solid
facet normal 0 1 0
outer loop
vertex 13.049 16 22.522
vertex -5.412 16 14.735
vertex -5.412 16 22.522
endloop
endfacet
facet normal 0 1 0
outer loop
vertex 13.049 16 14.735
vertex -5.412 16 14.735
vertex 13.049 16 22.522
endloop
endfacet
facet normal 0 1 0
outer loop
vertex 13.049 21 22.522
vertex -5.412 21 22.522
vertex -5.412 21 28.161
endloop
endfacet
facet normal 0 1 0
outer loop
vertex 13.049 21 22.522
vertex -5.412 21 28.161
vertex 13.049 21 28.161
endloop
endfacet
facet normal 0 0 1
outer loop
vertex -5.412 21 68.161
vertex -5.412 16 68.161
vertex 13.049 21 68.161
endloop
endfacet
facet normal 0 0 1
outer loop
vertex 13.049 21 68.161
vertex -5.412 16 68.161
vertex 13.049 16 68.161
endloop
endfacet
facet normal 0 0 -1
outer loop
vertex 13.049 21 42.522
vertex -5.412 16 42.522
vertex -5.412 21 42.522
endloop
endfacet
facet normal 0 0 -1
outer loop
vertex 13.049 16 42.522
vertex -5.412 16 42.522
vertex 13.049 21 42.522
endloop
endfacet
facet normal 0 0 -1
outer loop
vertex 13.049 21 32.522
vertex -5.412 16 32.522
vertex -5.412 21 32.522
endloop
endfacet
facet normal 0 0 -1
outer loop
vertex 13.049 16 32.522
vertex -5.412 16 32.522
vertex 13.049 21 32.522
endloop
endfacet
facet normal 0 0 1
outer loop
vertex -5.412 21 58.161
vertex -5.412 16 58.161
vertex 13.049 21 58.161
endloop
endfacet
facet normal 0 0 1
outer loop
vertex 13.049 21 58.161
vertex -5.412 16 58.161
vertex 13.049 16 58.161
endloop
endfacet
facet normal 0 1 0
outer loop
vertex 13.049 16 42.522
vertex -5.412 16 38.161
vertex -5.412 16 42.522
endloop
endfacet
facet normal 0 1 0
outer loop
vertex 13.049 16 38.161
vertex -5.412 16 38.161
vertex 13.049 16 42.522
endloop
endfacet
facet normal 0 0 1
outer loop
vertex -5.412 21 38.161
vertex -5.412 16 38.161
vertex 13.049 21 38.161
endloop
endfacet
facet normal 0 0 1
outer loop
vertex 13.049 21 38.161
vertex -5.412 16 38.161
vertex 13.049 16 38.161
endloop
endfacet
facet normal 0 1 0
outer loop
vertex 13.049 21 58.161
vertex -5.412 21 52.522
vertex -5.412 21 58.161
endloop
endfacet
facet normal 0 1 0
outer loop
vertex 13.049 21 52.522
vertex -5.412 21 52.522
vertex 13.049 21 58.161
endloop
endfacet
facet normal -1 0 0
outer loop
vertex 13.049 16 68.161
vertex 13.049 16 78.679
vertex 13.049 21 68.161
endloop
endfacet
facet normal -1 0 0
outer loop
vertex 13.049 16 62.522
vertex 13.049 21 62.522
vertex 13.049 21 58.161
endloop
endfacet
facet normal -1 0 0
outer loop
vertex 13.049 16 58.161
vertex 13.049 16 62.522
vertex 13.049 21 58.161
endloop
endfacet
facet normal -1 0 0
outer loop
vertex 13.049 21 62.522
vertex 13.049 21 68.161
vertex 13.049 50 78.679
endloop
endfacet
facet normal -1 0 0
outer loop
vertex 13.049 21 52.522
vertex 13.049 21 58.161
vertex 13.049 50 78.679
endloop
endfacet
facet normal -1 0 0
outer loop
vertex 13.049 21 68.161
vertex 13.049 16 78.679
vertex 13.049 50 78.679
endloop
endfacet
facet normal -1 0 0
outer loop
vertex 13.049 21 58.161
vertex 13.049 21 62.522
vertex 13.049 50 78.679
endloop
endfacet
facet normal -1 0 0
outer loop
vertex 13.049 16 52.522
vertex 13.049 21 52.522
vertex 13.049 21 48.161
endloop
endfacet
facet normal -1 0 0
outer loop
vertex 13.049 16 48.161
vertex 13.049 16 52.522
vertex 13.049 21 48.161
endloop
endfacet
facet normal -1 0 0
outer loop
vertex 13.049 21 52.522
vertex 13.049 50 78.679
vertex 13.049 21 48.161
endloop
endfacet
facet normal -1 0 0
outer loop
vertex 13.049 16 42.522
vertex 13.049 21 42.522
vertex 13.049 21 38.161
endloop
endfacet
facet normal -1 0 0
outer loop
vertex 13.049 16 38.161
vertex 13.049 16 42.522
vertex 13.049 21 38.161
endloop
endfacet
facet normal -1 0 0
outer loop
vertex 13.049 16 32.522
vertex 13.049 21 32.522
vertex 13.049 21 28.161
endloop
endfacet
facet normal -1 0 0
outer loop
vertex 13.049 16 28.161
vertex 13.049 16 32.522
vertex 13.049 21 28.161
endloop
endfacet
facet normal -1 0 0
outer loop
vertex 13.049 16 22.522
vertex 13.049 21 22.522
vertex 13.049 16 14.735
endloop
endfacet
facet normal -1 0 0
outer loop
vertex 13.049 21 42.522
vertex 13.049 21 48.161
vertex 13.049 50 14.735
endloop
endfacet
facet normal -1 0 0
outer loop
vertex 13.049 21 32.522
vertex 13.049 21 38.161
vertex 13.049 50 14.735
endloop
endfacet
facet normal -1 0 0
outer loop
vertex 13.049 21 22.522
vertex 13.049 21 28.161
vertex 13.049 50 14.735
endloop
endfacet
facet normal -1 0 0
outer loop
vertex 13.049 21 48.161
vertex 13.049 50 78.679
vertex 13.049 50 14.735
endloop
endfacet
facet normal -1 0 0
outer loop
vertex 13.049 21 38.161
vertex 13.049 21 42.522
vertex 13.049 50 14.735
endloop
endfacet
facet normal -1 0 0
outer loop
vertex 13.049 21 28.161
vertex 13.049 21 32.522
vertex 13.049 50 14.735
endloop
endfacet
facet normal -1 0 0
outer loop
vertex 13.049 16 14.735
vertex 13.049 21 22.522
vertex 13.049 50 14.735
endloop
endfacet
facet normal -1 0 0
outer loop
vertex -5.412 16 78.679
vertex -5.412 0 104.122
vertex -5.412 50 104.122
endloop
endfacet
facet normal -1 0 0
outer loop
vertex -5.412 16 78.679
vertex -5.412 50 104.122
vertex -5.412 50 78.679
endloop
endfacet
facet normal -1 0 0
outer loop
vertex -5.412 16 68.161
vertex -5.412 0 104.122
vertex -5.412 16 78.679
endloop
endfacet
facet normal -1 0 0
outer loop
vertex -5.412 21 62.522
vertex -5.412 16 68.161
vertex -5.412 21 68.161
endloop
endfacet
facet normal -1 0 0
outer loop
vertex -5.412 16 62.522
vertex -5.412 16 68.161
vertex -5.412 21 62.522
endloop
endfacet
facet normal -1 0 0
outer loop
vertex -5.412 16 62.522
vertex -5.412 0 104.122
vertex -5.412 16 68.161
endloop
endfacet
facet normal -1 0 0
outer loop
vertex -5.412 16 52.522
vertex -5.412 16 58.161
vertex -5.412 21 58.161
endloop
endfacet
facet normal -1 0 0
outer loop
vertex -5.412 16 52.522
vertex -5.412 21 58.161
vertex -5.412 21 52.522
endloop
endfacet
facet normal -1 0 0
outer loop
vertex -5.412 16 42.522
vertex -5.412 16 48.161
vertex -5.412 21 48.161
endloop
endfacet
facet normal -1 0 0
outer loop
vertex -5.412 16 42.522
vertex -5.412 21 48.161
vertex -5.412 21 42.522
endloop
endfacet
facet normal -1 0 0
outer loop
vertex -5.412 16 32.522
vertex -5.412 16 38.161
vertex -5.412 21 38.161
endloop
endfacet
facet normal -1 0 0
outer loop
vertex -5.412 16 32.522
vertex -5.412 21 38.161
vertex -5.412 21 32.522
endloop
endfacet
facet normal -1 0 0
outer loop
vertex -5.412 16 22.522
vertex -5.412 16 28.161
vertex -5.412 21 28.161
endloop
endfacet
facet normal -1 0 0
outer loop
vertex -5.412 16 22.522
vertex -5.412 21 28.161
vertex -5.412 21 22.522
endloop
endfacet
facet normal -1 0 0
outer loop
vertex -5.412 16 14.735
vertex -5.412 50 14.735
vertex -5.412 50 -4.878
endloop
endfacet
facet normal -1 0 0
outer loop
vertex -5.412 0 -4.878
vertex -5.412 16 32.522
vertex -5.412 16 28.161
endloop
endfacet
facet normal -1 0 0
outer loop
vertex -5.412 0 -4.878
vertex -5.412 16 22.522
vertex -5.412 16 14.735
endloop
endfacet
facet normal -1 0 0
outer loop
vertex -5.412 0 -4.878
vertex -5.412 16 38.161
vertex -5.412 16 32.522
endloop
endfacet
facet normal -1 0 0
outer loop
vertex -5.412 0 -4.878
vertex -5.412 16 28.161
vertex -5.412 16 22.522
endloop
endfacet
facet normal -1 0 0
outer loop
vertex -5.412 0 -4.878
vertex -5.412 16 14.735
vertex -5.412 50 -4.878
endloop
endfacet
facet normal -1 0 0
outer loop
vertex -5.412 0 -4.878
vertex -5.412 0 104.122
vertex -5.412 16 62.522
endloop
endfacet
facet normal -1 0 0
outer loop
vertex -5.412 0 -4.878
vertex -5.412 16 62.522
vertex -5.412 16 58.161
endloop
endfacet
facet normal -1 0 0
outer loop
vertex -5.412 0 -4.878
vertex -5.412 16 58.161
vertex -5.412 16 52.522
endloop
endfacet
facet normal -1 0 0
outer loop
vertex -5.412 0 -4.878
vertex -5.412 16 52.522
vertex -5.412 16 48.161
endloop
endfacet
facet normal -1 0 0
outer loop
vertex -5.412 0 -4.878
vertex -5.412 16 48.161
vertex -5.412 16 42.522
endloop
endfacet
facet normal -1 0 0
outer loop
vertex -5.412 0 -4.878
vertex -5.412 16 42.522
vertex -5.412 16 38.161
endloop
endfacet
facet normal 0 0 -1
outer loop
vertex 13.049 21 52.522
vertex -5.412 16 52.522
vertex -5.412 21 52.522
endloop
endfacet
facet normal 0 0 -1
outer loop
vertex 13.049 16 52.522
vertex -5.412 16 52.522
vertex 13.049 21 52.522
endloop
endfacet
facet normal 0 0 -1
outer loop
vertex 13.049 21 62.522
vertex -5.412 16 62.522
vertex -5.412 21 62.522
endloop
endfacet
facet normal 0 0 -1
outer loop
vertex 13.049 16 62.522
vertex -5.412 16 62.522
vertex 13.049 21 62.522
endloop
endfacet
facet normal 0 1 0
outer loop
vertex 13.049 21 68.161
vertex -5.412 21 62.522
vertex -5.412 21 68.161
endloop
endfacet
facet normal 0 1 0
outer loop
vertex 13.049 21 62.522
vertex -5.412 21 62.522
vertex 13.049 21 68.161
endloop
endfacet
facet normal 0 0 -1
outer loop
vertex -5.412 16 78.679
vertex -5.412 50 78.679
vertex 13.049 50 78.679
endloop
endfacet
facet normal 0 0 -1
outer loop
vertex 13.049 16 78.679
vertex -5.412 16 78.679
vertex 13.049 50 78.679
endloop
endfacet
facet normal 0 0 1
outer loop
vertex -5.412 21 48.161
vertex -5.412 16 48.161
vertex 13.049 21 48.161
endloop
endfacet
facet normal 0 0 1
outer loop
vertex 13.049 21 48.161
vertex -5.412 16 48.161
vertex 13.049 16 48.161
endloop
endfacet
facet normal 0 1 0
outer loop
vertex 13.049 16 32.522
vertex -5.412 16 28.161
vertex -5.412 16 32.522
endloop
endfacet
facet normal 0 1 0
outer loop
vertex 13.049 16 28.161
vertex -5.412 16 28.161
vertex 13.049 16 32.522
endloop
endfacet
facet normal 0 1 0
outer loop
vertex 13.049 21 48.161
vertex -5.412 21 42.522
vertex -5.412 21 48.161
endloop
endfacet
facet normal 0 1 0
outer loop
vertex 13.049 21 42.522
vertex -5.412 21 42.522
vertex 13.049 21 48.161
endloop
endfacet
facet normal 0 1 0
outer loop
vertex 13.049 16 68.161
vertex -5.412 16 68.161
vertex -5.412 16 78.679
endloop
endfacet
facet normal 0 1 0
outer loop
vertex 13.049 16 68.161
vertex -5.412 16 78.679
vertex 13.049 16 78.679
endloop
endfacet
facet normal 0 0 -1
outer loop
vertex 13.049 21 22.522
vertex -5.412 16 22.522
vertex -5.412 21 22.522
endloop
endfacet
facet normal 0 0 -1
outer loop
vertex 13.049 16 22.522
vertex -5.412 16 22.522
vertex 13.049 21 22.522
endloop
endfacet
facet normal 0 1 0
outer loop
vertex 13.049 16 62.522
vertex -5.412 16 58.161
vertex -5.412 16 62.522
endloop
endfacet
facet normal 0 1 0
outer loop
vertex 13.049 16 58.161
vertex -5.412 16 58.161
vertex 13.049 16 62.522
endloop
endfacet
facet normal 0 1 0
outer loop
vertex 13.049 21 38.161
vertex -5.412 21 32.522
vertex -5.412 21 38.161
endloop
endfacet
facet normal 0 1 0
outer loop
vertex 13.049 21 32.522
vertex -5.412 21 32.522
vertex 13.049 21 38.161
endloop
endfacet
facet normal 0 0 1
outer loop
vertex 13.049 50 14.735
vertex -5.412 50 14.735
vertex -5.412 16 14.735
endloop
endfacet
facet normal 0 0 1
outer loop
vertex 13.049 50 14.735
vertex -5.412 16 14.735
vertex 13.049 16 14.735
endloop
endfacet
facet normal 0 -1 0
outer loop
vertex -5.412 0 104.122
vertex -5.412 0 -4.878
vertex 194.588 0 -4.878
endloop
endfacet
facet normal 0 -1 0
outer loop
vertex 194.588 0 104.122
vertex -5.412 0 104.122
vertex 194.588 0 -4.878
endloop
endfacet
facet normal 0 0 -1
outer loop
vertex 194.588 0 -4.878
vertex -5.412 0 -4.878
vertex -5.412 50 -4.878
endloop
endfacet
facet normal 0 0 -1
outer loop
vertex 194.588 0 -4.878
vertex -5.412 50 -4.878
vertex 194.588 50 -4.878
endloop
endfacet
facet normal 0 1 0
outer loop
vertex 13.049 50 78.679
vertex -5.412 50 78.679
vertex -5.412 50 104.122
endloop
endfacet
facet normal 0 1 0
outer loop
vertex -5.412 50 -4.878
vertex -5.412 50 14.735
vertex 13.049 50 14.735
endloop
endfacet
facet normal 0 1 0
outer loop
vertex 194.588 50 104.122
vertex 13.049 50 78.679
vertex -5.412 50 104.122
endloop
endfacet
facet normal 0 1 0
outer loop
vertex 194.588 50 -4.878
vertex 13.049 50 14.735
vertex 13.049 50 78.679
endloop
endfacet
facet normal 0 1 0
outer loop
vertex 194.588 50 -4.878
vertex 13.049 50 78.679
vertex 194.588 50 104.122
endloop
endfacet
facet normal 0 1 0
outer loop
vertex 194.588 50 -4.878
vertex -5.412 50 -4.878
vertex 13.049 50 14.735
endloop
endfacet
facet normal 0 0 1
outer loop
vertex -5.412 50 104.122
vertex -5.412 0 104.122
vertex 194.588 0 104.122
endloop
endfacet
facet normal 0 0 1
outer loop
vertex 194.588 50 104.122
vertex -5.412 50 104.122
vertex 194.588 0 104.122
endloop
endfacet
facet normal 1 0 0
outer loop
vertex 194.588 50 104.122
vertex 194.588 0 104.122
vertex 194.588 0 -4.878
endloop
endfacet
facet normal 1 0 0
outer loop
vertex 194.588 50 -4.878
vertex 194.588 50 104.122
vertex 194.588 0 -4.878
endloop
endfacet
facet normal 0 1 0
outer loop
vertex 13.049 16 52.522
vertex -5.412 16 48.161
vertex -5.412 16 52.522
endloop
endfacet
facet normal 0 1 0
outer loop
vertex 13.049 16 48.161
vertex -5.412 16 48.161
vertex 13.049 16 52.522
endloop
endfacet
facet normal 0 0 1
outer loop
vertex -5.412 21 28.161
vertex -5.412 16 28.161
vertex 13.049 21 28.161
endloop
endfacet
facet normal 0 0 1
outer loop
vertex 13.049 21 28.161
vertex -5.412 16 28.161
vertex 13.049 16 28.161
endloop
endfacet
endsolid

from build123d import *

# Parameters (mm, degrees)
SKETCH_1_W             = 200
SKETCH_1_H             = 109
EXTRUDE_1_DEPTH        = 50
SKETCH_2_W             = 18.460680343
SKETCH_2_H             = 63.94452195
CUT_EXTRUDE_1_DEPTH    = 34
SKETCH_3_W             = 20.806626264
SKETCH_3_H             = 5.638388786
EXTRUDE_2_DEPTH        = 5
PATTERN_LINEAR_1_COUNT = 5
PATTERN_LINEAR_1_PITCH = 10


with BuildPart() as part:
    # 草图1 → 凸台-拉伸1 (new body)
    with BuildSketch(Plane(origin=(0, 0, 0), x_dir=(1, 0, 0), z_dir=(0, 1, 0))):
        with Locations((94.587973274, -49.622494432)):
            Rectangle(SKETCH_1_W, SKETCH_1_H)
    extrude(amount=EXTRUDE_1_DEPTH)

    # 草图2 → 切除-拉伸1 (cut)
    with BuildSketch(Plane(origin=(0, 50, 0), x_dir=(1, 0, 0), z_dir=(0, 1, 0))):
        with Locations((3.818313446, -46.706785098)):
            Rectangle(SKETCH_2_W, SKETCH_2_H)
    extrude(amount=-CUT_EXTRUDE_1_DEPTH, mode=Mode.SUBTRACT)

    # 草图3 → 凸台-拉伸2 (add)
    with BuildSketch(Plane(origin=(0, 16, 0), x_dir=(1, 0, 0), z_dir=(0, 1, 0))):
        with Locations((4.991286406, -25.341462736)):
            Rectangle(SKETCH_3_W, SKETCH_3_H)
    extrude_2 = extrude(amount=EXTRUDE_2_DEPTH)

    # 阵列(线性)1: 凸台-拉伸2 ×5
    with Locations(*[(0, 0, i * PATTERN_LINEAR_1_PITCH) for i in range(1, PATTERN_LINEAR_1_COUNT)]):
        add(extrude_2)


solid = part.part
